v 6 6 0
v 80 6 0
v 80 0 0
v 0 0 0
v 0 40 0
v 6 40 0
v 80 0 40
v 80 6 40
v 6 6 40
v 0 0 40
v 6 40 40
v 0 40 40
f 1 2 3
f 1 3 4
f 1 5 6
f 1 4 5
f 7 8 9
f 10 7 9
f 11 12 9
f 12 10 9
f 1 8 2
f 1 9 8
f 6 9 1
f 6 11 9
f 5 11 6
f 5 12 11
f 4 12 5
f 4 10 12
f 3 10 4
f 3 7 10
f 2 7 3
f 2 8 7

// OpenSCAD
$fn = 32;

// ----------------------------------------------------------------------
// Structural section: angle 80 x 40 mm
// ----------------------------------------------------------------------

// --- parameters (mm) ---
sec_w = 80;               // leg width, X
sec_h = 40;               // leg height, Y
flange_t = 6;             // leg thickness
plate_t = 40;             // cut length, Z (extrusion height)

profile = [[0, 0], [80, 0], [80, 6], [6, 6], [6, 40], [0, 40]];  // primary outline, 6 points, counter clockwise

// --- the one profile operation ---
linear_extrude(height = plate_t) polygon(points = profile);
